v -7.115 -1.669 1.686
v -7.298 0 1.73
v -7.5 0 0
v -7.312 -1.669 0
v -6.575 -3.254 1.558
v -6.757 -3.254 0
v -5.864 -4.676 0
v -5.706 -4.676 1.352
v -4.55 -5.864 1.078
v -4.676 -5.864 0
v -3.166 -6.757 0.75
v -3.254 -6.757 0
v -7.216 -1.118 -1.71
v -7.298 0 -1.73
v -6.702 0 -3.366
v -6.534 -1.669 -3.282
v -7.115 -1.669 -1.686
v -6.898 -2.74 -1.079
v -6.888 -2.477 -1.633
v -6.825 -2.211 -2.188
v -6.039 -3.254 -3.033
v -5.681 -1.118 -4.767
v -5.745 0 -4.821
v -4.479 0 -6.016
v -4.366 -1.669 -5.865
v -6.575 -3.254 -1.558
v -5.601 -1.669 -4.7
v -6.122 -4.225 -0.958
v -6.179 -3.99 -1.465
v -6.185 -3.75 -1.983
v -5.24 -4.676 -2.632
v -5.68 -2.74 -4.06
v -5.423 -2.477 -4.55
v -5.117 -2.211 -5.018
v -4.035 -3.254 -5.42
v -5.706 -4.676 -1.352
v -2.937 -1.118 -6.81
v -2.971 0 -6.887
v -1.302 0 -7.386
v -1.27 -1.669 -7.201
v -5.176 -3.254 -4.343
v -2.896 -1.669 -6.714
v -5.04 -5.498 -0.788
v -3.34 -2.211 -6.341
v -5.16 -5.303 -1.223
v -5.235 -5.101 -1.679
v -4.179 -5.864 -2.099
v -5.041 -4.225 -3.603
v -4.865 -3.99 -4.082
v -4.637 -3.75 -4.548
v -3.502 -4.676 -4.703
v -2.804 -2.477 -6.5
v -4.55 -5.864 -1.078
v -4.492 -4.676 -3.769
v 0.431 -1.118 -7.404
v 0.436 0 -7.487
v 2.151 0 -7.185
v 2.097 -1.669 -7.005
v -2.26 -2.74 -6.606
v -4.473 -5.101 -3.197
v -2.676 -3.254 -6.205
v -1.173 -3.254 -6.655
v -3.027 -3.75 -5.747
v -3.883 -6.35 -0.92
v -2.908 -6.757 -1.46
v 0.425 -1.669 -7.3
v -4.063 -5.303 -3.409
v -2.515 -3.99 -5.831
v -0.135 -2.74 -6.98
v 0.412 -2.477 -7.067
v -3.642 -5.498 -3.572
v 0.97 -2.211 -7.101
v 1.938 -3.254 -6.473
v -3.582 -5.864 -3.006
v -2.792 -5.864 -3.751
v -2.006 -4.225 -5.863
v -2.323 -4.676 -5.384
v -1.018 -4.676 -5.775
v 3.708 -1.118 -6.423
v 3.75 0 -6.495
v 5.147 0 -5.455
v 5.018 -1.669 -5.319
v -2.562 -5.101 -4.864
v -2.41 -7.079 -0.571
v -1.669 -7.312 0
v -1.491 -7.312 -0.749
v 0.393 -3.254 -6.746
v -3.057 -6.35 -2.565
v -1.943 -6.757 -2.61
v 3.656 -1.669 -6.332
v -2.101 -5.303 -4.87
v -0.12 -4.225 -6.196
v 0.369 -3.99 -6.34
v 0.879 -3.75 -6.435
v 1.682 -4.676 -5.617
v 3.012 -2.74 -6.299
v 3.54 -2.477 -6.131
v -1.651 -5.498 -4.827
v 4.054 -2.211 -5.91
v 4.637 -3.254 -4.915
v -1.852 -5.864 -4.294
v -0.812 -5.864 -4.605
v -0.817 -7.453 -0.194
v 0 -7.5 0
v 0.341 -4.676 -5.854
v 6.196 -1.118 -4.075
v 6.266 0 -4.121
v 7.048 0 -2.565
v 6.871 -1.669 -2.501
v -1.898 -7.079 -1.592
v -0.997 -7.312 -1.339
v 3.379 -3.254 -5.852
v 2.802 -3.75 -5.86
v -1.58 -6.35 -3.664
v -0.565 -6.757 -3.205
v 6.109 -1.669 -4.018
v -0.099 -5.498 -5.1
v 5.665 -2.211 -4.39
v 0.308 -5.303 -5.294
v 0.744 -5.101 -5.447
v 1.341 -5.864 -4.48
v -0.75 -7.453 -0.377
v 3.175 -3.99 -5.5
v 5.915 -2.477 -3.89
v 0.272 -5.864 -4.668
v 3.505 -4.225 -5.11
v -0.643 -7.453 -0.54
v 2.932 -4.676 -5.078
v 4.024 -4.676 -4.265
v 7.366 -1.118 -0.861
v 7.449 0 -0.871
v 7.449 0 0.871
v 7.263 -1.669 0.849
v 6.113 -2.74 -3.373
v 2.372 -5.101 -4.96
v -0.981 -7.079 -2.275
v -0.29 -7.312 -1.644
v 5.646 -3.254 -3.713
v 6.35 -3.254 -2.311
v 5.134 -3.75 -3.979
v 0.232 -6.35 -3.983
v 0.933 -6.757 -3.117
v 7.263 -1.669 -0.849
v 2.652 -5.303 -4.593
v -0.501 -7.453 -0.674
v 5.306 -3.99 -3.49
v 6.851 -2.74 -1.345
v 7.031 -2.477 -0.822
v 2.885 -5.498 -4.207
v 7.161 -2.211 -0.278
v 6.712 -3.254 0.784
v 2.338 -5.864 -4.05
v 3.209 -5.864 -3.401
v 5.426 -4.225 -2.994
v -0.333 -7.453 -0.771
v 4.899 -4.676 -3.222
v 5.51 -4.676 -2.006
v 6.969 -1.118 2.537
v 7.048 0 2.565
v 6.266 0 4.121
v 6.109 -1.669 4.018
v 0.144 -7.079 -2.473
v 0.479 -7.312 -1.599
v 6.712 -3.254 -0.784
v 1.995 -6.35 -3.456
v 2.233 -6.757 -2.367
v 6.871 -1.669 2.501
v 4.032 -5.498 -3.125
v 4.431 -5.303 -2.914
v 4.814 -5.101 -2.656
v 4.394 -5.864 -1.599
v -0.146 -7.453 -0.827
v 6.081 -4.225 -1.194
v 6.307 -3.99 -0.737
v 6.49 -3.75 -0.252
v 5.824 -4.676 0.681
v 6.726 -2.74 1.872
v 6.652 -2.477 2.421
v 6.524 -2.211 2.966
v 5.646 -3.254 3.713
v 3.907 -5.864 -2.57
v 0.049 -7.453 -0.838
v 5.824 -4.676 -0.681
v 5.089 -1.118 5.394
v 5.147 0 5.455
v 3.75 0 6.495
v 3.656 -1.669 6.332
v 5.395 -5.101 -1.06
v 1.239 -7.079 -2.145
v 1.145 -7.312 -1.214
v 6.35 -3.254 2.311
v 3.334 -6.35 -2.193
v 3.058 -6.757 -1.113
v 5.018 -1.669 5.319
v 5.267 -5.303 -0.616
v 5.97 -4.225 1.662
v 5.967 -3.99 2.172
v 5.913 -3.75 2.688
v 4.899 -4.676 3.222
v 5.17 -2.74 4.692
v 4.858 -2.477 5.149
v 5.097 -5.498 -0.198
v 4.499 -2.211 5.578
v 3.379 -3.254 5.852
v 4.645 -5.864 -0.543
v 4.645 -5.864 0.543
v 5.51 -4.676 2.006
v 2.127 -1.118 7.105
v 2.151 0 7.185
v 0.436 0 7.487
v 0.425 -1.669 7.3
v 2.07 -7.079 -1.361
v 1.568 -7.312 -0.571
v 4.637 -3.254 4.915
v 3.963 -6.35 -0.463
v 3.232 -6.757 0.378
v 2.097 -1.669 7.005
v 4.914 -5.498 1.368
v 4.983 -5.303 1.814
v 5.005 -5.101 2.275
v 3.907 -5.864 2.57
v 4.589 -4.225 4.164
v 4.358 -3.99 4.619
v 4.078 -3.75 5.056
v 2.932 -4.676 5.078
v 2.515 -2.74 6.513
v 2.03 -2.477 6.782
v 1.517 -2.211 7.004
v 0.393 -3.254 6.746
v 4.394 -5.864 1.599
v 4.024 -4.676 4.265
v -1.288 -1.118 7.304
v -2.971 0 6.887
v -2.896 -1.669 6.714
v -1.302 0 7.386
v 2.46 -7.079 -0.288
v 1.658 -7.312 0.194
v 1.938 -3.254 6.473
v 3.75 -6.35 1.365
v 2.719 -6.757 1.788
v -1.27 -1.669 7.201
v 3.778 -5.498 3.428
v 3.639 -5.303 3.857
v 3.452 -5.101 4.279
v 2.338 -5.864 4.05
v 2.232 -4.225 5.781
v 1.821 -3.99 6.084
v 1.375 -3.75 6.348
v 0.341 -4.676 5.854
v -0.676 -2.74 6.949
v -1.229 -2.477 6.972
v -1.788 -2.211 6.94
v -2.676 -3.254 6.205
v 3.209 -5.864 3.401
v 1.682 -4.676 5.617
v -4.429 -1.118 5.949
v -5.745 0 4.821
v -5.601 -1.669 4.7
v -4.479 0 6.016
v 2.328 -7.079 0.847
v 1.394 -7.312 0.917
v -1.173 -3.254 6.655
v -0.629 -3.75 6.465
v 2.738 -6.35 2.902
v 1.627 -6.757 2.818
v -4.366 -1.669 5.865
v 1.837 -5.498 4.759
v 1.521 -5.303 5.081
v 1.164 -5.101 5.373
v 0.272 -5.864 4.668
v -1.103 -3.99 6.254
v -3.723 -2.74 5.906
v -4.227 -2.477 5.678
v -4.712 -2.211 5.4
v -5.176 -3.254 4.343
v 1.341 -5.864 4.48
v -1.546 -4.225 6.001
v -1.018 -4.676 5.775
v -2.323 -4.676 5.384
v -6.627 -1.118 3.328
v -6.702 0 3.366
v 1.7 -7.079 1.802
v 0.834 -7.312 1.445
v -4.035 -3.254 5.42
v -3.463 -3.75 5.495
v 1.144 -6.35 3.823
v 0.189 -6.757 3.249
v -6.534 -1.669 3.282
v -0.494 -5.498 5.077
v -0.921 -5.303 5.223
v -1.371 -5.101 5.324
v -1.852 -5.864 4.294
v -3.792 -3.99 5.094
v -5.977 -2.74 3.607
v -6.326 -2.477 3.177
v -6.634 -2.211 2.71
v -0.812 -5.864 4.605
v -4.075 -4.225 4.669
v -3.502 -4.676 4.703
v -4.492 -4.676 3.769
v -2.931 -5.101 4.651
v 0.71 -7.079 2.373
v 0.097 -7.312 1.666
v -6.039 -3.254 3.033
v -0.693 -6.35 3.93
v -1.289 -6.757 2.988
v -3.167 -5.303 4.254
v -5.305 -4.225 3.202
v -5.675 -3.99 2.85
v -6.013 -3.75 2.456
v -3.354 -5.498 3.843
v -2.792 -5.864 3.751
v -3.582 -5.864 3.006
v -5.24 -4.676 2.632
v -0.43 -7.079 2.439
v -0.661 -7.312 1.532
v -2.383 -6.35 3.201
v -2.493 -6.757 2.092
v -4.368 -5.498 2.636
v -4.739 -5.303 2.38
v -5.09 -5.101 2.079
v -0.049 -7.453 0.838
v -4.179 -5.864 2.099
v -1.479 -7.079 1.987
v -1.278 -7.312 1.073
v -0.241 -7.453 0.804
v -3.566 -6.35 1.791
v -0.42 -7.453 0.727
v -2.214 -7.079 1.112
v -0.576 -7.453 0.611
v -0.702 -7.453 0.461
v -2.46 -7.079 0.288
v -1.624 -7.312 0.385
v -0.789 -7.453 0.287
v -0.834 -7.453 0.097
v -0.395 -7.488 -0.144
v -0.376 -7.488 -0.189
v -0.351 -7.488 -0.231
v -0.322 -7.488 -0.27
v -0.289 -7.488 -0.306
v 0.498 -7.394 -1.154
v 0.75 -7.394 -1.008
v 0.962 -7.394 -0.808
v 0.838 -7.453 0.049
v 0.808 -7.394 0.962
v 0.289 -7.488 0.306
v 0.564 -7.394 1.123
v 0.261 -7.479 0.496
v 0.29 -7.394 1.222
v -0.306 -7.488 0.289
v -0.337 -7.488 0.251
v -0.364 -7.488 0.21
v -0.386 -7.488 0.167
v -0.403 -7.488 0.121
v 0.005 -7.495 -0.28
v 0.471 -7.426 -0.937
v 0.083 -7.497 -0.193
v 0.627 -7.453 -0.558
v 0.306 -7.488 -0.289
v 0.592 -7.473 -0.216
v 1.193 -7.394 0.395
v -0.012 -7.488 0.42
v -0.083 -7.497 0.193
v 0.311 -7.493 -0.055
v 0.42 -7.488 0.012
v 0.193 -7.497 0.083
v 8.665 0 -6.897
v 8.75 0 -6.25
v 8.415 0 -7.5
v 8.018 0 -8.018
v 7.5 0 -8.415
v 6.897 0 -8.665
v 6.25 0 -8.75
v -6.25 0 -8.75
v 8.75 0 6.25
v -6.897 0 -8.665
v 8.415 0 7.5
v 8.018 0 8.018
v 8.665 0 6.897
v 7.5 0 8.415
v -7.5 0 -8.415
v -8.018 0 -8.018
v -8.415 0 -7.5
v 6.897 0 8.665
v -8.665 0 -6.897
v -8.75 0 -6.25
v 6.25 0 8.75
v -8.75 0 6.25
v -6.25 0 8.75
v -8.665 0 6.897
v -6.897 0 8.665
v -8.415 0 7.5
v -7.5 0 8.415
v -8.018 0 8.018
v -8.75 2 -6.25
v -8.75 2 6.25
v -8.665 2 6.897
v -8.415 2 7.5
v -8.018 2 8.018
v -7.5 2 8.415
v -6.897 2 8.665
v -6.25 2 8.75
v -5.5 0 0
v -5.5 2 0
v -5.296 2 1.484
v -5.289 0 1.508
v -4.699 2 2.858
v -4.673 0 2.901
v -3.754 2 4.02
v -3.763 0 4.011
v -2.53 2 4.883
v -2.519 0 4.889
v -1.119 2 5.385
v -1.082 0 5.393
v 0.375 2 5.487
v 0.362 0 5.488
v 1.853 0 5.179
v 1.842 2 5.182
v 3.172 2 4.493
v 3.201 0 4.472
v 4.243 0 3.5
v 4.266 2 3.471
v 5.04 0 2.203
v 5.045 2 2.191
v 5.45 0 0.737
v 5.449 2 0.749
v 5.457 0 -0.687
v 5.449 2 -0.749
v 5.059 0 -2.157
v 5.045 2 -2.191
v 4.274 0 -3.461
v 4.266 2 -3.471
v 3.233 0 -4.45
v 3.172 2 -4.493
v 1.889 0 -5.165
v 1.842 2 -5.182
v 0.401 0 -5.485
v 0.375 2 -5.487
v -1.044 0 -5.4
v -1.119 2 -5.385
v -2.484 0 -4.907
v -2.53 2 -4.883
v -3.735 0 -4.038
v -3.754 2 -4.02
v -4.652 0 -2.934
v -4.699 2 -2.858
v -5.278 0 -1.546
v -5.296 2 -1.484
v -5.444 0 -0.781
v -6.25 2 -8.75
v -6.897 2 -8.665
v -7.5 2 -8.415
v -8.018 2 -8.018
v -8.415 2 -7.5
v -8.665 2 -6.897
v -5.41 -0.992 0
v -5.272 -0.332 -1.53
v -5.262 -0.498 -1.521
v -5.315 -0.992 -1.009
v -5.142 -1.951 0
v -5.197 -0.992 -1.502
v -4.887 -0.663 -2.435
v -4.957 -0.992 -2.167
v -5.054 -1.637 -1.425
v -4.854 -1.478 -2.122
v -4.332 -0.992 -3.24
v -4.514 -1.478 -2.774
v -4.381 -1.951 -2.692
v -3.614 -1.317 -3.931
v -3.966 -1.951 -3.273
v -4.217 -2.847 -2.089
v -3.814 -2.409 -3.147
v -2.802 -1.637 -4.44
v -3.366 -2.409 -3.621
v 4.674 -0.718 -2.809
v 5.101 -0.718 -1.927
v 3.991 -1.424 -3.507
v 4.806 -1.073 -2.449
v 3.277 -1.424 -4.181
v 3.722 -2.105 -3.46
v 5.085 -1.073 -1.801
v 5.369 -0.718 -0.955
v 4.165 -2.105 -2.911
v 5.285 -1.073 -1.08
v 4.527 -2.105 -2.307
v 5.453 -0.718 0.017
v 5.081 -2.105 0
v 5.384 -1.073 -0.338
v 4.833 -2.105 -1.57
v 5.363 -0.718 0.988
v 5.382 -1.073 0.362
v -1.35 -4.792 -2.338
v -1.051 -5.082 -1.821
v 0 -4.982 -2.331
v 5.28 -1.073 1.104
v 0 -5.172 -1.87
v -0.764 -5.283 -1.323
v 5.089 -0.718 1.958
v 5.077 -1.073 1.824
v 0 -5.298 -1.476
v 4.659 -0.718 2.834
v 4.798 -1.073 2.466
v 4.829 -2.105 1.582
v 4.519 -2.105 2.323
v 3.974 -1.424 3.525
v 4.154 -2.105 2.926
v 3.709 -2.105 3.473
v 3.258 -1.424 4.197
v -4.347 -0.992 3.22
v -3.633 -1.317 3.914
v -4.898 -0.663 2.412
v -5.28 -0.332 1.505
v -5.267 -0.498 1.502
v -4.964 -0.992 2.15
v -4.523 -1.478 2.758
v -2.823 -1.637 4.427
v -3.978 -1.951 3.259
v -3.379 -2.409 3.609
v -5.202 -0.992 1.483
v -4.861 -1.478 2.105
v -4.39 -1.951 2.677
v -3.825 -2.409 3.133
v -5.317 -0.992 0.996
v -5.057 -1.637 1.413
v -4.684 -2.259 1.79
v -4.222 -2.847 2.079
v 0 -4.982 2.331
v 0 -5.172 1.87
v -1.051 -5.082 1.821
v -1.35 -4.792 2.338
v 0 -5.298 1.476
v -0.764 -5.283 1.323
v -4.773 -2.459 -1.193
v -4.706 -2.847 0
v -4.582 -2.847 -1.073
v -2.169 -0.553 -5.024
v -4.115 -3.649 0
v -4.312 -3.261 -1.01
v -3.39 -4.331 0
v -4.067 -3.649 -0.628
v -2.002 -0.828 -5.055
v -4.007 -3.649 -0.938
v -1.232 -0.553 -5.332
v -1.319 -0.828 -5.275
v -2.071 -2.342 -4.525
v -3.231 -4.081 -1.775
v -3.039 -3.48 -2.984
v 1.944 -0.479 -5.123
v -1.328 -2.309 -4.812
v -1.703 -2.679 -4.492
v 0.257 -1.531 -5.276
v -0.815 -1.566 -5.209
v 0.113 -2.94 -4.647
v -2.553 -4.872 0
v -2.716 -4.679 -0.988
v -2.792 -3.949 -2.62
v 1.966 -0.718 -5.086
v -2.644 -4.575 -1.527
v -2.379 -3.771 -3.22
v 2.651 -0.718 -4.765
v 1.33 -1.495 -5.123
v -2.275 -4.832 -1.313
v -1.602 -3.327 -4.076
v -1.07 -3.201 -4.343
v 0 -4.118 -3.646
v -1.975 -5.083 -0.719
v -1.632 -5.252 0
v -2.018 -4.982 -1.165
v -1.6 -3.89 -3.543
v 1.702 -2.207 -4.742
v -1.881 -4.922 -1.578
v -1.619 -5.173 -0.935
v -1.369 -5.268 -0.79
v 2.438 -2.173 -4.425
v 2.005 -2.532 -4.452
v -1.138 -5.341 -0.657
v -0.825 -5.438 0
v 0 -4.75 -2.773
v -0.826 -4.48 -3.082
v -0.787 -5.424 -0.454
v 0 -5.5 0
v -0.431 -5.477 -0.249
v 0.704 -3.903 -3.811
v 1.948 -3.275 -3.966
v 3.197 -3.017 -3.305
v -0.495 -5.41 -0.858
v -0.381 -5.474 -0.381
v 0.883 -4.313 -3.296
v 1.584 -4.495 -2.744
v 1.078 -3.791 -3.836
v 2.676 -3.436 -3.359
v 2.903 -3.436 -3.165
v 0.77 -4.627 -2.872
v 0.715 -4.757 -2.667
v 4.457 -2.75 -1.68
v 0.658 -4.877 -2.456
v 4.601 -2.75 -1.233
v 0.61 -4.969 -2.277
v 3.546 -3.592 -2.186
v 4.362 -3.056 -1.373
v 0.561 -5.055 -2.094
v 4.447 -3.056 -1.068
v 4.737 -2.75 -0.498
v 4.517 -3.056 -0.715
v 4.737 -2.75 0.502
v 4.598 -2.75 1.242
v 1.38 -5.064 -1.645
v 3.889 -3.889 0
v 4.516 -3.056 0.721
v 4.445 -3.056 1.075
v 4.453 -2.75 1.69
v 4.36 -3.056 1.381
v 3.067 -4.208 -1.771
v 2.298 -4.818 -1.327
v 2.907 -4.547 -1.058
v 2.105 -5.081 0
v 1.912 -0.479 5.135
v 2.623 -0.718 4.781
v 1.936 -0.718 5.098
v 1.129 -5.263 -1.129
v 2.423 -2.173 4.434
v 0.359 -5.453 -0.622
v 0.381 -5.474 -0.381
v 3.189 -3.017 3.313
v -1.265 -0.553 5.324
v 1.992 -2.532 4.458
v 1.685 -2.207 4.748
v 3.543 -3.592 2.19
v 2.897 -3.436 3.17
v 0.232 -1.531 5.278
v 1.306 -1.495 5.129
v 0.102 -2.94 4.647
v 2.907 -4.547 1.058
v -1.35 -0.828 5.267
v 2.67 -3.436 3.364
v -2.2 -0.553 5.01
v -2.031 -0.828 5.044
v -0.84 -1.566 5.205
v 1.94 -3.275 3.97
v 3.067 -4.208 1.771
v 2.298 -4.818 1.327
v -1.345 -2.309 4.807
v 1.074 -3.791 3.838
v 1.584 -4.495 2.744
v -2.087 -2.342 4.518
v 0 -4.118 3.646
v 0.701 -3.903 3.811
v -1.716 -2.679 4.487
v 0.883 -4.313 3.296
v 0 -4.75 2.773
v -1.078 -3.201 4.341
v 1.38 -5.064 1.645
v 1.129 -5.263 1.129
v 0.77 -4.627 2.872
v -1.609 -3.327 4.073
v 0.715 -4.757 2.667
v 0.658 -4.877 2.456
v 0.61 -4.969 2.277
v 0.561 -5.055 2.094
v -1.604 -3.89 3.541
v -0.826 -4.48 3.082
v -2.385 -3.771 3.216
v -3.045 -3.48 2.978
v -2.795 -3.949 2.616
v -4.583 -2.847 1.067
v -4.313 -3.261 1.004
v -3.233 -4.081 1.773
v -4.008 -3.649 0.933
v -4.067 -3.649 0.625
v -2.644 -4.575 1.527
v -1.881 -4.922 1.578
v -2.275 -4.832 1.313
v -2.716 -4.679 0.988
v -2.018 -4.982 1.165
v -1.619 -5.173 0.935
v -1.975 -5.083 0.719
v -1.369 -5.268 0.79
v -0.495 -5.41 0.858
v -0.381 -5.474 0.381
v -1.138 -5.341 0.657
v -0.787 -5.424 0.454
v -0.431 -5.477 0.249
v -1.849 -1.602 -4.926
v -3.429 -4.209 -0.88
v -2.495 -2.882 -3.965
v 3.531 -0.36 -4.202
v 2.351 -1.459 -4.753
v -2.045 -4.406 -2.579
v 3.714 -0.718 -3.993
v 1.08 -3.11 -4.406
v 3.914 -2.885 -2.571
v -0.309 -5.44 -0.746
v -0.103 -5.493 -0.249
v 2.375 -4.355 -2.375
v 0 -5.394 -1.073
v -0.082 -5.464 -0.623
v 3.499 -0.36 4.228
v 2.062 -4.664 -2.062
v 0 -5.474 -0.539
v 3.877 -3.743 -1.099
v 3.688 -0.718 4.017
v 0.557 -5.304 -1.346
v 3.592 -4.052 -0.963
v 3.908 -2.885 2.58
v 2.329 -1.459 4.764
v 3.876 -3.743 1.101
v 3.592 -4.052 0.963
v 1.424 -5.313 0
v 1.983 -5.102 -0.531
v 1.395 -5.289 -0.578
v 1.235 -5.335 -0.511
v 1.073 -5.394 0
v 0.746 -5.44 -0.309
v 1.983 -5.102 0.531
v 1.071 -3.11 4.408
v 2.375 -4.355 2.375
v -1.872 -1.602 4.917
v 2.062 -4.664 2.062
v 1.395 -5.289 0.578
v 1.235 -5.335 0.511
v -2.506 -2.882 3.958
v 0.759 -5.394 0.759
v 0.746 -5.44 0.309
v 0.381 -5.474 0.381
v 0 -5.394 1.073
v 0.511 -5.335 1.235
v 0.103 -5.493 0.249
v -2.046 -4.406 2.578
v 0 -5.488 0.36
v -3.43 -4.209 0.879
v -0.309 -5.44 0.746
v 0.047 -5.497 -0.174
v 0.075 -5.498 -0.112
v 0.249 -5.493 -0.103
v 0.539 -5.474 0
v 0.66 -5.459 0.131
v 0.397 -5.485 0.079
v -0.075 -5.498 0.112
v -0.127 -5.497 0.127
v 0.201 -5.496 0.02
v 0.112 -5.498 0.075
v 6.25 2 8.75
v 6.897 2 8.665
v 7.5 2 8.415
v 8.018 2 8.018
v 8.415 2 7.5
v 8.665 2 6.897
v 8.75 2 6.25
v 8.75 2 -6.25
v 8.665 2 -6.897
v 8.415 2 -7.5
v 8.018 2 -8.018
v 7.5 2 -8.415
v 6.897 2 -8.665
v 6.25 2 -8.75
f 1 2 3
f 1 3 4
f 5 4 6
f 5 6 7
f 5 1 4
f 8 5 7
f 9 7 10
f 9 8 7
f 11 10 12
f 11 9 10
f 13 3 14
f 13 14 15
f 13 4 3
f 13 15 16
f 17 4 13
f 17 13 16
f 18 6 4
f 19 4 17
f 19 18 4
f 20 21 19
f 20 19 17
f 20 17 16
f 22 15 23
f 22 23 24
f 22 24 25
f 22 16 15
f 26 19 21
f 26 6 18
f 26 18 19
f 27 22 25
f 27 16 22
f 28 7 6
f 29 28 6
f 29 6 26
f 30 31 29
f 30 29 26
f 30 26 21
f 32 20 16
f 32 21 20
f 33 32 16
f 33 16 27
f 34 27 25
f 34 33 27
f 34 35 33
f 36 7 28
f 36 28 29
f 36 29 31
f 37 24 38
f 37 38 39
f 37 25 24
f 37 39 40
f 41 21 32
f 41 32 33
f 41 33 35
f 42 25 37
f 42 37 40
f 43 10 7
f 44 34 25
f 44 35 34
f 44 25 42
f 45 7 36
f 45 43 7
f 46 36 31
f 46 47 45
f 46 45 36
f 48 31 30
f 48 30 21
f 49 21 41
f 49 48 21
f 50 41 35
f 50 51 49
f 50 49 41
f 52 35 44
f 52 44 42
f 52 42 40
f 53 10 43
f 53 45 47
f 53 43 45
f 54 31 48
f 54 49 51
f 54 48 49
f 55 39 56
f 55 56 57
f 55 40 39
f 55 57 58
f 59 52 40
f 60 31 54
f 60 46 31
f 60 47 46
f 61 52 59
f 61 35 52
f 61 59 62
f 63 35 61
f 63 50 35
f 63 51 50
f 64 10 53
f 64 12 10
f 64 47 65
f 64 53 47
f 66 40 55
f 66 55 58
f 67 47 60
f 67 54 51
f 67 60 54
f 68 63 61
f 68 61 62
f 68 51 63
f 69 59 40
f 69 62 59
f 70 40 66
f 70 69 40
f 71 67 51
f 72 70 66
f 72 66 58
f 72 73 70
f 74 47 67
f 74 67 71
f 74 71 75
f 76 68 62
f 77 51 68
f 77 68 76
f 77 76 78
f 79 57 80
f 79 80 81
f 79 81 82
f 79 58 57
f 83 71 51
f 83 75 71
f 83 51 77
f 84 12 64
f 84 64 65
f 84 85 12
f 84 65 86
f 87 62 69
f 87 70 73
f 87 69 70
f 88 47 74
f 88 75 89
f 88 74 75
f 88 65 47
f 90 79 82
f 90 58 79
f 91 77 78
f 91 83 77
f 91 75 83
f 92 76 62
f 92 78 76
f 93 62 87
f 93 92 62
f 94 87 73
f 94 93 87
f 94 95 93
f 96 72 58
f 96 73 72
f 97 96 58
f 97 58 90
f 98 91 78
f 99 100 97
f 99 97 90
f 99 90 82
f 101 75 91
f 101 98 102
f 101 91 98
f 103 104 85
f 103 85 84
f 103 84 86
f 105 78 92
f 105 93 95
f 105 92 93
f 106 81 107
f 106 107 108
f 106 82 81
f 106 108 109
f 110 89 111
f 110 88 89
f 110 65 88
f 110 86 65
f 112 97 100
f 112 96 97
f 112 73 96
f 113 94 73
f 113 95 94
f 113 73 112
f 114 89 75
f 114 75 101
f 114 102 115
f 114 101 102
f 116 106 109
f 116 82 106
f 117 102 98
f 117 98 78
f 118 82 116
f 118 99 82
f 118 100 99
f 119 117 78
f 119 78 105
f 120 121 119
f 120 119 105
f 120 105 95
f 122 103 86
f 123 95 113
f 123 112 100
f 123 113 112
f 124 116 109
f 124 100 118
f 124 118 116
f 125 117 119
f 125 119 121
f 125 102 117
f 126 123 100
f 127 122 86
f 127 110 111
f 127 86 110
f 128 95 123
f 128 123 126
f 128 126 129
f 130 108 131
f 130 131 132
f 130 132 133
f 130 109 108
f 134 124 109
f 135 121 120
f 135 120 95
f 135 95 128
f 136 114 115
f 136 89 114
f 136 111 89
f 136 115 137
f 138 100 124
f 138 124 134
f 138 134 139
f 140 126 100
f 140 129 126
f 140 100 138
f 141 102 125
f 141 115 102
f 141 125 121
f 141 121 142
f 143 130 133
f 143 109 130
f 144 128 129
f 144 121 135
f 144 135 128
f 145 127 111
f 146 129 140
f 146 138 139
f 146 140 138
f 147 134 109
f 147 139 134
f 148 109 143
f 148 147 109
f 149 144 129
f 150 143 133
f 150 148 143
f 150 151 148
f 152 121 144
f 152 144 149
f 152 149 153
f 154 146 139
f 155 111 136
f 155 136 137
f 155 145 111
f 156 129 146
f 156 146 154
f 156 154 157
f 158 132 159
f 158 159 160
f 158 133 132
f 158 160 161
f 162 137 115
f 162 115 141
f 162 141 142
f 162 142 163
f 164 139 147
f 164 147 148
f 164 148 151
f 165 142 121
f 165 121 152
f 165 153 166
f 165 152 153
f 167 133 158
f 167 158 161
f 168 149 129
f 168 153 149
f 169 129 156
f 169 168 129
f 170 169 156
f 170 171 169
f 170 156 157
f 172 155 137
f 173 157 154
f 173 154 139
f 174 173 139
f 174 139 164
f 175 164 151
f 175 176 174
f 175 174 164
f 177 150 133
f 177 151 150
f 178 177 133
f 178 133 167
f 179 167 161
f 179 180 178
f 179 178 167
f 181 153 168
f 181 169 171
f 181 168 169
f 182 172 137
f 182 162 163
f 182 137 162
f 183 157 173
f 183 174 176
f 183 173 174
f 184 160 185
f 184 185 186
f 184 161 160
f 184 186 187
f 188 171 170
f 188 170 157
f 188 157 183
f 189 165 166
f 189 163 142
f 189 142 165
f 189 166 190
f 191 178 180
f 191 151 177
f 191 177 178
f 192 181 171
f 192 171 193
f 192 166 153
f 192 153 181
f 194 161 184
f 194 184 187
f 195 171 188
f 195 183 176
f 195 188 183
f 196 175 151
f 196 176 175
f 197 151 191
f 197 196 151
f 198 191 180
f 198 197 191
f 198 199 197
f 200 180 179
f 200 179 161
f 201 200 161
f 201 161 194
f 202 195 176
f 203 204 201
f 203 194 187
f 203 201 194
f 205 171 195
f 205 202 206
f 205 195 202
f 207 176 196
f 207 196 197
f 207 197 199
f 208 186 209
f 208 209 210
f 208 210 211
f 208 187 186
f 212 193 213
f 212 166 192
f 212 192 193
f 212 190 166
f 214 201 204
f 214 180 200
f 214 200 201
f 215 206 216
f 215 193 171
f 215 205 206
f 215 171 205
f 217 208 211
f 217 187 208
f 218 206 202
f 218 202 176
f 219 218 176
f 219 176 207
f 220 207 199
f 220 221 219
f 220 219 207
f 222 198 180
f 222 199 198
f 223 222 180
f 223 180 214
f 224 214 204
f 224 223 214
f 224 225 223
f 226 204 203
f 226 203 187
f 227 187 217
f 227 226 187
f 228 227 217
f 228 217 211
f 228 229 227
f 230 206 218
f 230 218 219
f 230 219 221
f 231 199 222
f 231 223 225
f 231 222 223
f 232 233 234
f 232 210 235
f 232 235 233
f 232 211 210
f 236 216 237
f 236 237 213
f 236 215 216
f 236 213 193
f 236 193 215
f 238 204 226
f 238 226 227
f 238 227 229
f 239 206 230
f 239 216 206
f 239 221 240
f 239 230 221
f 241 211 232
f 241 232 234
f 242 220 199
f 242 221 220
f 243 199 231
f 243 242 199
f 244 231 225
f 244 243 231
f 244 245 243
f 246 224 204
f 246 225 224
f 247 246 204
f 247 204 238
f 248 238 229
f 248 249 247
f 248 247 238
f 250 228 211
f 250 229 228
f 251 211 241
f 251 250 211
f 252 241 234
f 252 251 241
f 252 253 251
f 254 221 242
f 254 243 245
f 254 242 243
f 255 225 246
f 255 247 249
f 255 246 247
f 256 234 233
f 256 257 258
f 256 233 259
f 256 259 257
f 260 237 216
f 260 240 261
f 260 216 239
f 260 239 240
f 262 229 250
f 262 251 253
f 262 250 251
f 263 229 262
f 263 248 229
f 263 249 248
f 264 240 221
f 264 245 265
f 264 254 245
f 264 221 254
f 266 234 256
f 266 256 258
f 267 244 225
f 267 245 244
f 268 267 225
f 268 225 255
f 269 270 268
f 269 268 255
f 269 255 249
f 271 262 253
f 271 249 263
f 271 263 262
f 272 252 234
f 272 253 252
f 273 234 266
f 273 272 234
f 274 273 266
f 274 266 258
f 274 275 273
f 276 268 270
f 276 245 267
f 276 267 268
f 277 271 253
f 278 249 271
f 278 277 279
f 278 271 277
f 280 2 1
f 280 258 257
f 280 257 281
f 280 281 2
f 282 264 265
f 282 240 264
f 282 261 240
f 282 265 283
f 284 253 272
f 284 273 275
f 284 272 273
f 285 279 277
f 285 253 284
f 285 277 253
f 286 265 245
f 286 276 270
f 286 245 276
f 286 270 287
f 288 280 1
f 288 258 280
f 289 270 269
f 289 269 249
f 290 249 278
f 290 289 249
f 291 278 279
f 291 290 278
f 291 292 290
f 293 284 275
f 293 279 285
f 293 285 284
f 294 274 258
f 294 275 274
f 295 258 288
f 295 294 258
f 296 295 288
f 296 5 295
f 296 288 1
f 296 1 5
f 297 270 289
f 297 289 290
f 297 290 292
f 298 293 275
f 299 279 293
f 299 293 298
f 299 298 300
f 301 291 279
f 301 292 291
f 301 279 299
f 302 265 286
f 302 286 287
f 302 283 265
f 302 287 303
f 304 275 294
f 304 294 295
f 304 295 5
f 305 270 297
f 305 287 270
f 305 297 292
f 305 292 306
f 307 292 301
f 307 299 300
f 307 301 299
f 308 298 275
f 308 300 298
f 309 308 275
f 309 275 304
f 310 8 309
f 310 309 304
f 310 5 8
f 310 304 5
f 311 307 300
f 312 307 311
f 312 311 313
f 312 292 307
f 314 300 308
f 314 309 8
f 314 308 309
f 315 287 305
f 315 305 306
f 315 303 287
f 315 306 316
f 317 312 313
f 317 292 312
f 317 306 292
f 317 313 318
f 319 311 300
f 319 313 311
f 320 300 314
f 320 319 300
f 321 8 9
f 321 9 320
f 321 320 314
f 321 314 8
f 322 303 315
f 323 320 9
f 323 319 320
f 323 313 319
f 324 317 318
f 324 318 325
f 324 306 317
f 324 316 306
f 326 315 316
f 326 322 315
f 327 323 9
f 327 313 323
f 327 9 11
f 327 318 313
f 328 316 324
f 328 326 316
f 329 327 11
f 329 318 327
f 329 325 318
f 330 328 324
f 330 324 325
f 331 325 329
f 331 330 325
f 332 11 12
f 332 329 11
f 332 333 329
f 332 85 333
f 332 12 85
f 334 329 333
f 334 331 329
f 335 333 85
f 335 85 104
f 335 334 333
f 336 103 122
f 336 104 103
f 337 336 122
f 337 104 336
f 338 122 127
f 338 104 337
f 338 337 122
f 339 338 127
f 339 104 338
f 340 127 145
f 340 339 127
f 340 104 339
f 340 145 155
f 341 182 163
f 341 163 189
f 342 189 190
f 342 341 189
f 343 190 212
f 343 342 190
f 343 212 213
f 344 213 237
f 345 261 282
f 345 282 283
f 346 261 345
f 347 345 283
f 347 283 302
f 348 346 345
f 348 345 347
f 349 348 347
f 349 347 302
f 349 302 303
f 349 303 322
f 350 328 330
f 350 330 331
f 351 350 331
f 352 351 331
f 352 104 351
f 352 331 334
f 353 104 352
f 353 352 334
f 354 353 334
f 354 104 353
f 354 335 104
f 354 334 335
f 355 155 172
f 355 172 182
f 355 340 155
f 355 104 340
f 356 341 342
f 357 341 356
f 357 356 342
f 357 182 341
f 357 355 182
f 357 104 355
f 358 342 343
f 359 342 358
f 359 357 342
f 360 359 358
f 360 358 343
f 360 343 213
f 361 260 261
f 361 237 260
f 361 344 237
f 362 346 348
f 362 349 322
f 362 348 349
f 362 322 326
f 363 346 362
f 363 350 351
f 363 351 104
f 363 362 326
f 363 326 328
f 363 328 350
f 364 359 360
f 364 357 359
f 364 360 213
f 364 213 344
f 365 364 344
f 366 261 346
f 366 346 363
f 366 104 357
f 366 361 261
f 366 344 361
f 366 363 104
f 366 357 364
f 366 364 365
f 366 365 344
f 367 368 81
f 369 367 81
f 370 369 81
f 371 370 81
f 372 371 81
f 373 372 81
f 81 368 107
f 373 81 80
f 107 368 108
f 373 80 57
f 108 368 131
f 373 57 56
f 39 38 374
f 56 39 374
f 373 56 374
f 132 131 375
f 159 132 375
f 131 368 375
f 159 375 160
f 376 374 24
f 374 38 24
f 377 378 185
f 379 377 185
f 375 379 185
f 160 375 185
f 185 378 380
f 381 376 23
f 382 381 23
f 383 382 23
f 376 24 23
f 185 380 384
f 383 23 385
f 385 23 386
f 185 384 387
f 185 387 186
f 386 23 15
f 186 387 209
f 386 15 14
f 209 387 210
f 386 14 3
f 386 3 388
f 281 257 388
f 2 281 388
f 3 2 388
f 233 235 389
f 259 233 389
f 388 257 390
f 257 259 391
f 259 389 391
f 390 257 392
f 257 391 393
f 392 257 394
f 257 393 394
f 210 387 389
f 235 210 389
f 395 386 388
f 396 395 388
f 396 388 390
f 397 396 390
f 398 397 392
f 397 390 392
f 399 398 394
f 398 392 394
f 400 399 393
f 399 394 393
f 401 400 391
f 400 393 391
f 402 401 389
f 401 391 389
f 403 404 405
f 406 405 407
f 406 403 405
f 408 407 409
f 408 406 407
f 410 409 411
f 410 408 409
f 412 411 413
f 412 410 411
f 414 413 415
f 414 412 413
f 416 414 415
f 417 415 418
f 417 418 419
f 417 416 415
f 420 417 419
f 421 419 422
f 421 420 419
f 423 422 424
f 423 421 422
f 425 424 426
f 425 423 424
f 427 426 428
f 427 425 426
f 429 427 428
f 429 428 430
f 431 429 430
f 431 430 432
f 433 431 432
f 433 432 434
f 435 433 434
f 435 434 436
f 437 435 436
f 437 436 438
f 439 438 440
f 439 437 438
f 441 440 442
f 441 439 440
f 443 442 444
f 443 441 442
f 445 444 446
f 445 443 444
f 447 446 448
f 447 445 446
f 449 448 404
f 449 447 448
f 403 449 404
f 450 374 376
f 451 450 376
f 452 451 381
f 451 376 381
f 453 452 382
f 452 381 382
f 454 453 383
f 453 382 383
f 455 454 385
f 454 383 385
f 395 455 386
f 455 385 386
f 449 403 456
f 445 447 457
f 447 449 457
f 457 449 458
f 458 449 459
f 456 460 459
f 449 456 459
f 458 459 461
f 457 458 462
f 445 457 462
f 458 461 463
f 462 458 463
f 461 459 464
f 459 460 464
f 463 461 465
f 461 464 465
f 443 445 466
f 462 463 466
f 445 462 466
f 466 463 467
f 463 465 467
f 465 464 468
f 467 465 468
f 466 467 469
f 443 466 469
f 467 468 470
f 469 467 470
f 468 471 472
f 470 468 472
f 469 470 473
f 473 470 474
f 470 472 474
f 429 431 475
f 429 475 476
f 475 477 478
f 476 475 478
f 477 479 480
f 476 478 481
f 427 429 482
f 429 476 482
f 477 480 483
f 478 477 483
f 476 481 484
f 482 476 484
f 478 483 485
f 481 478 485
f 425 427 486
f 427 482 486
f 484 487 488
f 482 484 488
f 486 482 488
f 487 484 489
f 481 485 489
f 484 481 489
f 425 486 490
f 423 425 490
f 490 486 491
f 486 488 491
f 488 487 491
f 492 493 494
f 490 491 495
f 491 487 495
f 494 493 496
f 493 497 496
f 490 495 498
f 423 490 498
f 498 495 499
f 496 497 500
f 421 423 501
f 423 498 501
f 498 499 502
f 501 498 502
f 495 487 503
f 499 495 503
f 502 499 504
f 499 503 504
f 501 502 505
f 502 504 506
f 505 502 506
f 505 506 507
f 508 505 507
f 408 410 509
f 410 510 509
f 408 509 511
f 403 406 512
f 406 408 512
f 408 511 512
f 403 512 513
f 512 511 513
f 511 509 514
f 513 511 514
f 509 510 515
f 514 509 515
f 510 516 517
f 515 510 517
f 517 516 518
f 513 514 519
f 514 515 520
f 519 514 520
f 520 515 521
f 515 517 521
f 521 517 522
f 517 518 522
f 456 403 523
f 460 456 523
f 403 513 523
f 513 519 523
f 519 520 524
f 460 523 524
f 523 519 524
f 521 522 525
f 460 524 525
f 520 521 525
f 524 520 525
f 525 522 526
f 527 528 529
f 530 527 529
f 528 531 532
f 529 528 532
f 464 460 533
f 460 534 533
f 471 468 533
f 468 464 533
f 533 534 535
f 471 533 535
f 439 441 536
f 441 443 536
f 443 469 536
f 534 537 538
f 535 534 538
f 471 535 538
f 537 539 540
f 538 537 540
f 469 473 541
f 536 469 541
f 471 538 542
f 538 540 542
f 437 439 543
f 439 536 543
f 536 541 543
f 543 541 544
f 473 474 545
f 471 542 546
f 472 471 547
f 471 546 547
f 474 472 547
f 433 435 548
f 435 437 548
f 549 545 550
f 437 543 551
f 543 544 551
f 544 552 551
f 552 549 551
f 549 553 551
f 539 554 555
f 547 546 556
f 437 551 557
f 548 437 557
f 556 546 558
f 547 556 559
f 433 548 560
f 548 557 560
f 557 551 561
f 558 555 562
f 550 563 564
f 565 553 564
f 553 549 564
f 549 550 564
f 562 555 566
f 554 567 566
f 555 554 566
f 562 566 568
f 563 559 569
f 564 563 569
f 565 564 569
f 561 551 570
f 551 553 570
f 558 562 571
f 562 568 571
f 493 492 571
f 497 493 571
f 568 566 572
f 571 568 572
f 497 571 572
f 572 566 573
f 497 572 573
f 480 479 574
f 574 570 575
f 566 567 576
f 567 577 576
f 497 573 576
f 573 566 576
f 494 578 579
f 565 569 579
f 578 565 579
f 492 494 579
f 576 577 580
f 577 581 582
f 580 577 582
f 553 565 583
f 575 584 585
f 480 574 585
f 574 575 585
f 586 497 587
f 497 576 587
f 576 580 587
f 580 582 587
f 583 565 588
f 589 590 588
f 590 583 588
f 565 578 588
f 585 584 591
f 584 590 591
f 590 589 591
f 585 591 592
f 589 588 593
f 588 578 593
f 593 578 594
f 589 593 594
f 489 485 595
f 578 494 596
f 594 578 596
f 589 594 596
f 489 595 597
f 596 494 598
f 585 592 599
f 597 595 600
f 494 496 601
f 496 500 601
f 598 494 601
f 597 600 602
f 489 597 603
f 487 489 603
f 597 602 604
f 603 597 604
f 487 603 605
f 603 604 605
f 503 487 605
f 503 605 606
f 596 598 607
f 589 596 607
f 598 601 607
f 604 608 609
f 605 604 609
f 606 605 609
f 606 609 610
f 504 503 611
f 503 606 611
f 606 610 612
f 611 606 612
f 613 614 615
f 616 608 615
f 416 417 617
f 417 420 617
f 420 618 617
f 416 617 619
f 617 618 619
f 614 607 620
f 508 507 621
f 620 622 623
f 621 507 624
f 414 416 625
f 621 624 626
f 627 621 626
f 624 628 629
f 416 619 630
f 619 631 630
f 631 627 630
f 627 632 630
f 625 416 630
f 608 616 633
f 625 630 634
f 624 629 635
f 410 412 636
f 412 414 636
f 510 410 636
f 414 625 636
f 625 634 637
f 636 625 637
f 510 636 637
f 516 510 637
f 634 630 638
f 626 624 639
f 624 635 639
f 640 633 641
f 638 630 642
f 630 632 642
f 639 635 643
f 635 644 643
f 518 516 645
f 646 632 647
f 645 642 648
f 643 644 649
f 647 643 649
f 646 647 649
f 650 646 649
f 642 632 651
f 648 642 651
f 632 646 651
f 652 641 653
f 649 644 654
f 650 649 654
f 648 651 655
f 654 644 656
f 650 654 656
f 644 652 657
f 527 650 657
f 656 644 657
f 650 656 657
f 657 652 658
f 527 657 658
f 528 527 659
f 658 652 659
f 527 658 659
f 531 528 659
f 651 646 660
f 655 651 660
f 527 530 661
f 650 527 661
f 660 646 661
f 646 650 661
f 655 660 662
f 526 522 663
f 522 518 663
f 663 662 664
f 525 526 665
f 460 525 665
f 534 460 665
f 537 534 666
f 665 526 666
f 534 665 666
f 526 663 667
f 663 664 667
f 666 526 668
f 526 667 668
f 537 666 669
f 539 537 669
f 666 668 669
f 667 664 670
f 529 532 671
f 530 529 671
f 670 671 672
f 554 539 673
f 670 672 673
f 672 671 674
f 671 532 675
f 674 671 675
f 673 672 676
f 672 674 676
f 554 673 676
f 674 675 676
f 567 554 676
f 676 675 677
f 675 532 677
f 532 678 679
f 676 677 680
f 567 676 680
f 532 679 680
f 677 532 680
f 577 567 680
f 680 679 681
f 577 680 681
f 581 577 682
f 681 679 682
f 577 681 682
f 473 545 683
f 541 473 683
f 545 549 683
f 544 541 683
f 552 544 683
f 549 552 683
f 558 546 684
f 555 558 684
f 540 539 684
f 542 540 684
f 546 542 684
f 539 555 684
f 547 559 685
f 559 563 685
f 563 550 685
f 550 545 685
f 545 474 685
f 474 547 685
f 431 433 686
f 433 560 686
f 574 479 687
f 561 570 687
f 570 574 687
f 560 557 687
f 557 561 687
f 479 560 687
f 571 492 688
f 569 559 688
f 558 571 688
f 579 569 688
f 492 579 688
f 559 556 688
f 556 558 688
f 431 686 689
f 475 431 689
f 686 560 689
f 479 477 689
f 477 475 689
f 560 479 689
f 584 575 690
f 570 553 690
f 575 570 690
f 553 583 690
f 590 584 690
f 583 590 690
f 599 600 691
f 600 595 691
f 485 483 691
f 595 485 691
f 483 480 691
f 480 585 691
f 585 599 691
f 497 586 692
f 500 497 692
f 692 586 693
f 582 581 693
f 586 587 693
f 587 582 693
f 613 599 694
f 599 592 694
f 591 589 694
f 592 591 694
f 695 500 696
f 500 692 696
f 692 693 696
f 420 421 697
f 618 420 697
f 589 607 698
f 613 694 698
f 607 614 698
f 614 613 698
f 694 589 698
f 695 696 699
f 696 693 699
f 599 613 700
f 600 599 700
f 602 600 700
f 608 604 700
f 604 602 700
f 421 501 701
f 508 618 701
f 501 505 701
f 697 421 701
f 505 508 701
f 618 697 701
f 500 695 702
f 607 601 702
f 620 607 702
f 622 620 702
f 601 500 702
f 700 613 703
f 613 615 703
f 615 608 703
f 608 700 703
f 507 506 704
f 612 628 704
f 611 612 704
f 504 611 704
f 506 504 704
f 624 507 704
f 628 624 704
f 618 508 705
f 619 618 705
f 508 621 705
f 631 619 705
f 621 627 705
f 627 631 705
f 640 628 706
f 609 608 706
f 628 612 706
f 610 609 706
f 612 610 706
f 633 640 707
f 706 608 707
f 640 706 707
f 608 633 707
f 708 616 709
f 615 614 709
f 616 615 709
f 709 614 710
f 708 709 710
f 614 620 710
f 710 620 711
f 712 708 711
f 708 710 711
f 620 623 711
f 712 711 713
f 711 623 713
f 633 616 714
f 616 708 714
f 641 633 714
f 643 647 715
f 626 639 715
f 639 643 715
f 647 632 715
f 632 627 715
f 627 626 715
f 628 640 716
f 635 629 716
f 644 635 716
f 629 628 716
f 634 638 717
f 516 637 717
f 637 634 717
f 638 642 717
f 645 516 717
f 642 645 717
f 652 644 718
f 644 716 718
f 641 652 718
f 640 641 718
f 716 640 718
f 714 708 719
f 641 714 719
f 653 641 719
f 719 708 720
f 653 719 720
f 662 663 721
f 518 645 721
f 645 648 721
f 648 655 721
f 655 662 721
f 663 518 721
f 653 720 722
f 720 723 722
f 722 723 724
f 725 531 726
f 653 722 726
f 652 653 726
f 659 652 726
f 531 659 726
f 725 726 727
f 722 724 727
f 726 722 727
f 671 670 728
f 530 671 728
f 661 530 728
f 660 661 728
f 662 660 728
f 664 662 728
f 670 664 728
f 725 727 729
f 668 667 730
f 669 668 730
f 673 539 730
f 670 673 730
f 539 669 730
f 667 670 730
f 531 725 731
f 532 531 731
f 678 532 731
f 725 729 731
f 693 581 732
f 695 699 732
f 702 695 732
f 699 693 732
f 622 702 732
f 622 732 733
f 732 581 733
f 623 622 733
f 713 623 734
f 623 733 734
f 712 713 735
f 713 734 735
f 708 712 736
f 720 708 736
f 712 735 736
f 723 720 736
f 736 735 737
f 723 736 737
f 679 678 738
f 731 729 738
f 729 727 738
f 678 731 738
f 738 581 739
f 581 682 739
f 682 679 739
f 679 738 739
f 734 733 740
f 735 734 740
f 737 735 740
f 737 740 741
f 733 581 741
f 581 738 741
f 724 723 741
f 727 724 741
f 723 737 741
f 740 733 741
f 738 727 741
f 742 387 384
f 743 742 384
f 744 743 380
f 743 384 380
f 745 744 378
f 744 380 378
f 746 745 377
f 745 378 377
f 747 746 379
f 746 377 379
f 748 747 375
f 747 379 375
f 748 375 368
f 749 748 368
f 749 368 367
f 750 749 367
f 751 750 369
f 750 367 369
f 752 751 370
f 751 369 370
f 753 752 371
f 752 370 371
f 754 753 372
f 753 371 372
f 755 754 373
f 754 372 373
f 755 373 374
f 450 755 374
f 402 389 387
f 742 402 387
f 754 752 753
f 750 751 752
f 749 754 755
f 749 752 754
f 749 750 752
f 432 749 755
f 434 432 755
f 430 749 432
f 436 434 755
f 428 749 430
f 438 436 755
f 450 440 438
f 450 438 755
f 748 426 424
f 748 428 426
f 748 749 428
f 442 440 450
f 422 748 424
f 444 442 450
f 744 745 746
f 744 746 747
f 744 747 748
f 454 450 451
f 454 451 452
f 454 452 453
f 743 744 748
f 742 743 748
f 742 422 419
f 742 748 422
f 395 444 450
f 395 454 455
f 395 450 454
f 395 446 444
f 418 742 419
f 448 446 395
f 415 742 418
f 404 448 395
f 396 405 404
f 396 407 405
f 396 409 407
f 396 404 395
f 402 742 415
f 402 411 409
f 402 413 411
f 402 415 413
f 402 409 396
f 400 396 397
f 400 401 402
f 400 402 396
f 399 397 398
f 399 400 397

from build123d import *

# Parameters (mm, degrees)
F2_T     = -2
F3_R     = 7.5
F3_R_2   = 5.5
F4_DEPTH = 2


with BuildPart() as f1:
    # F0 (on Top) → F1 (revolve)
    with BuildSketch(Plane.XY):
        with BuildLine():
            Line((0, 0), (-7.5, 0))
            ThreePointArc((-7.5, 0), (-5.303301, -5.303301), (0, -7.5))
            Line((0, -7.5), (0, 0))
        make_face()
    revolve(axis=Axis((0, -3.75, 0), (0, -1, 0)))

    # F2
    f2_openings = [f1.faces().sort_by_distance(p)[0] for p in [
        (0, 0, 0),
    ]]
    offset(amount=F2_T, openings=f2_openings)

    # F3 (on face) → F4 (join)
    with BuildSketch(Plane(origin=(0, 0, 0), x_dir=(-1, 0, 0), z_dir=(0, 1, 0))):
        with BuildLine():
            Line((-6.25, -8.75), (6.25, -8.75))
            ThreePointArc((6.25, -8.75), (8.017767, -8.017767), (8.75, -6.25))
            Line((8.75, -6.25), (8.75, 6.25))
            ThreePointArc((8.75, 6.25), (8.017767, 8.017767), (6.25, 8.75))
            Line((6.25, 8.75), (-6.25, 8.75))
            ThreePointArc((-6.25, 8.75), (-8.017767, 8.017767), (-8.75, 6.25))
            Line((-8.75, 6.25), (-8.75, -6.25))
            ThreePointArc((-8.75, -6.25), (-8.017767, -8.017767), (-6.25, -8.75))
        make_face()
        Circle(F3_R, mode=Mode.SUBTRACT)
        Circle(F3_R)
        Circle(F3_R_2, mode=Mode.SUBTRACT)
    extrude(amount=F4_DEPTH)


solid = f1.part
